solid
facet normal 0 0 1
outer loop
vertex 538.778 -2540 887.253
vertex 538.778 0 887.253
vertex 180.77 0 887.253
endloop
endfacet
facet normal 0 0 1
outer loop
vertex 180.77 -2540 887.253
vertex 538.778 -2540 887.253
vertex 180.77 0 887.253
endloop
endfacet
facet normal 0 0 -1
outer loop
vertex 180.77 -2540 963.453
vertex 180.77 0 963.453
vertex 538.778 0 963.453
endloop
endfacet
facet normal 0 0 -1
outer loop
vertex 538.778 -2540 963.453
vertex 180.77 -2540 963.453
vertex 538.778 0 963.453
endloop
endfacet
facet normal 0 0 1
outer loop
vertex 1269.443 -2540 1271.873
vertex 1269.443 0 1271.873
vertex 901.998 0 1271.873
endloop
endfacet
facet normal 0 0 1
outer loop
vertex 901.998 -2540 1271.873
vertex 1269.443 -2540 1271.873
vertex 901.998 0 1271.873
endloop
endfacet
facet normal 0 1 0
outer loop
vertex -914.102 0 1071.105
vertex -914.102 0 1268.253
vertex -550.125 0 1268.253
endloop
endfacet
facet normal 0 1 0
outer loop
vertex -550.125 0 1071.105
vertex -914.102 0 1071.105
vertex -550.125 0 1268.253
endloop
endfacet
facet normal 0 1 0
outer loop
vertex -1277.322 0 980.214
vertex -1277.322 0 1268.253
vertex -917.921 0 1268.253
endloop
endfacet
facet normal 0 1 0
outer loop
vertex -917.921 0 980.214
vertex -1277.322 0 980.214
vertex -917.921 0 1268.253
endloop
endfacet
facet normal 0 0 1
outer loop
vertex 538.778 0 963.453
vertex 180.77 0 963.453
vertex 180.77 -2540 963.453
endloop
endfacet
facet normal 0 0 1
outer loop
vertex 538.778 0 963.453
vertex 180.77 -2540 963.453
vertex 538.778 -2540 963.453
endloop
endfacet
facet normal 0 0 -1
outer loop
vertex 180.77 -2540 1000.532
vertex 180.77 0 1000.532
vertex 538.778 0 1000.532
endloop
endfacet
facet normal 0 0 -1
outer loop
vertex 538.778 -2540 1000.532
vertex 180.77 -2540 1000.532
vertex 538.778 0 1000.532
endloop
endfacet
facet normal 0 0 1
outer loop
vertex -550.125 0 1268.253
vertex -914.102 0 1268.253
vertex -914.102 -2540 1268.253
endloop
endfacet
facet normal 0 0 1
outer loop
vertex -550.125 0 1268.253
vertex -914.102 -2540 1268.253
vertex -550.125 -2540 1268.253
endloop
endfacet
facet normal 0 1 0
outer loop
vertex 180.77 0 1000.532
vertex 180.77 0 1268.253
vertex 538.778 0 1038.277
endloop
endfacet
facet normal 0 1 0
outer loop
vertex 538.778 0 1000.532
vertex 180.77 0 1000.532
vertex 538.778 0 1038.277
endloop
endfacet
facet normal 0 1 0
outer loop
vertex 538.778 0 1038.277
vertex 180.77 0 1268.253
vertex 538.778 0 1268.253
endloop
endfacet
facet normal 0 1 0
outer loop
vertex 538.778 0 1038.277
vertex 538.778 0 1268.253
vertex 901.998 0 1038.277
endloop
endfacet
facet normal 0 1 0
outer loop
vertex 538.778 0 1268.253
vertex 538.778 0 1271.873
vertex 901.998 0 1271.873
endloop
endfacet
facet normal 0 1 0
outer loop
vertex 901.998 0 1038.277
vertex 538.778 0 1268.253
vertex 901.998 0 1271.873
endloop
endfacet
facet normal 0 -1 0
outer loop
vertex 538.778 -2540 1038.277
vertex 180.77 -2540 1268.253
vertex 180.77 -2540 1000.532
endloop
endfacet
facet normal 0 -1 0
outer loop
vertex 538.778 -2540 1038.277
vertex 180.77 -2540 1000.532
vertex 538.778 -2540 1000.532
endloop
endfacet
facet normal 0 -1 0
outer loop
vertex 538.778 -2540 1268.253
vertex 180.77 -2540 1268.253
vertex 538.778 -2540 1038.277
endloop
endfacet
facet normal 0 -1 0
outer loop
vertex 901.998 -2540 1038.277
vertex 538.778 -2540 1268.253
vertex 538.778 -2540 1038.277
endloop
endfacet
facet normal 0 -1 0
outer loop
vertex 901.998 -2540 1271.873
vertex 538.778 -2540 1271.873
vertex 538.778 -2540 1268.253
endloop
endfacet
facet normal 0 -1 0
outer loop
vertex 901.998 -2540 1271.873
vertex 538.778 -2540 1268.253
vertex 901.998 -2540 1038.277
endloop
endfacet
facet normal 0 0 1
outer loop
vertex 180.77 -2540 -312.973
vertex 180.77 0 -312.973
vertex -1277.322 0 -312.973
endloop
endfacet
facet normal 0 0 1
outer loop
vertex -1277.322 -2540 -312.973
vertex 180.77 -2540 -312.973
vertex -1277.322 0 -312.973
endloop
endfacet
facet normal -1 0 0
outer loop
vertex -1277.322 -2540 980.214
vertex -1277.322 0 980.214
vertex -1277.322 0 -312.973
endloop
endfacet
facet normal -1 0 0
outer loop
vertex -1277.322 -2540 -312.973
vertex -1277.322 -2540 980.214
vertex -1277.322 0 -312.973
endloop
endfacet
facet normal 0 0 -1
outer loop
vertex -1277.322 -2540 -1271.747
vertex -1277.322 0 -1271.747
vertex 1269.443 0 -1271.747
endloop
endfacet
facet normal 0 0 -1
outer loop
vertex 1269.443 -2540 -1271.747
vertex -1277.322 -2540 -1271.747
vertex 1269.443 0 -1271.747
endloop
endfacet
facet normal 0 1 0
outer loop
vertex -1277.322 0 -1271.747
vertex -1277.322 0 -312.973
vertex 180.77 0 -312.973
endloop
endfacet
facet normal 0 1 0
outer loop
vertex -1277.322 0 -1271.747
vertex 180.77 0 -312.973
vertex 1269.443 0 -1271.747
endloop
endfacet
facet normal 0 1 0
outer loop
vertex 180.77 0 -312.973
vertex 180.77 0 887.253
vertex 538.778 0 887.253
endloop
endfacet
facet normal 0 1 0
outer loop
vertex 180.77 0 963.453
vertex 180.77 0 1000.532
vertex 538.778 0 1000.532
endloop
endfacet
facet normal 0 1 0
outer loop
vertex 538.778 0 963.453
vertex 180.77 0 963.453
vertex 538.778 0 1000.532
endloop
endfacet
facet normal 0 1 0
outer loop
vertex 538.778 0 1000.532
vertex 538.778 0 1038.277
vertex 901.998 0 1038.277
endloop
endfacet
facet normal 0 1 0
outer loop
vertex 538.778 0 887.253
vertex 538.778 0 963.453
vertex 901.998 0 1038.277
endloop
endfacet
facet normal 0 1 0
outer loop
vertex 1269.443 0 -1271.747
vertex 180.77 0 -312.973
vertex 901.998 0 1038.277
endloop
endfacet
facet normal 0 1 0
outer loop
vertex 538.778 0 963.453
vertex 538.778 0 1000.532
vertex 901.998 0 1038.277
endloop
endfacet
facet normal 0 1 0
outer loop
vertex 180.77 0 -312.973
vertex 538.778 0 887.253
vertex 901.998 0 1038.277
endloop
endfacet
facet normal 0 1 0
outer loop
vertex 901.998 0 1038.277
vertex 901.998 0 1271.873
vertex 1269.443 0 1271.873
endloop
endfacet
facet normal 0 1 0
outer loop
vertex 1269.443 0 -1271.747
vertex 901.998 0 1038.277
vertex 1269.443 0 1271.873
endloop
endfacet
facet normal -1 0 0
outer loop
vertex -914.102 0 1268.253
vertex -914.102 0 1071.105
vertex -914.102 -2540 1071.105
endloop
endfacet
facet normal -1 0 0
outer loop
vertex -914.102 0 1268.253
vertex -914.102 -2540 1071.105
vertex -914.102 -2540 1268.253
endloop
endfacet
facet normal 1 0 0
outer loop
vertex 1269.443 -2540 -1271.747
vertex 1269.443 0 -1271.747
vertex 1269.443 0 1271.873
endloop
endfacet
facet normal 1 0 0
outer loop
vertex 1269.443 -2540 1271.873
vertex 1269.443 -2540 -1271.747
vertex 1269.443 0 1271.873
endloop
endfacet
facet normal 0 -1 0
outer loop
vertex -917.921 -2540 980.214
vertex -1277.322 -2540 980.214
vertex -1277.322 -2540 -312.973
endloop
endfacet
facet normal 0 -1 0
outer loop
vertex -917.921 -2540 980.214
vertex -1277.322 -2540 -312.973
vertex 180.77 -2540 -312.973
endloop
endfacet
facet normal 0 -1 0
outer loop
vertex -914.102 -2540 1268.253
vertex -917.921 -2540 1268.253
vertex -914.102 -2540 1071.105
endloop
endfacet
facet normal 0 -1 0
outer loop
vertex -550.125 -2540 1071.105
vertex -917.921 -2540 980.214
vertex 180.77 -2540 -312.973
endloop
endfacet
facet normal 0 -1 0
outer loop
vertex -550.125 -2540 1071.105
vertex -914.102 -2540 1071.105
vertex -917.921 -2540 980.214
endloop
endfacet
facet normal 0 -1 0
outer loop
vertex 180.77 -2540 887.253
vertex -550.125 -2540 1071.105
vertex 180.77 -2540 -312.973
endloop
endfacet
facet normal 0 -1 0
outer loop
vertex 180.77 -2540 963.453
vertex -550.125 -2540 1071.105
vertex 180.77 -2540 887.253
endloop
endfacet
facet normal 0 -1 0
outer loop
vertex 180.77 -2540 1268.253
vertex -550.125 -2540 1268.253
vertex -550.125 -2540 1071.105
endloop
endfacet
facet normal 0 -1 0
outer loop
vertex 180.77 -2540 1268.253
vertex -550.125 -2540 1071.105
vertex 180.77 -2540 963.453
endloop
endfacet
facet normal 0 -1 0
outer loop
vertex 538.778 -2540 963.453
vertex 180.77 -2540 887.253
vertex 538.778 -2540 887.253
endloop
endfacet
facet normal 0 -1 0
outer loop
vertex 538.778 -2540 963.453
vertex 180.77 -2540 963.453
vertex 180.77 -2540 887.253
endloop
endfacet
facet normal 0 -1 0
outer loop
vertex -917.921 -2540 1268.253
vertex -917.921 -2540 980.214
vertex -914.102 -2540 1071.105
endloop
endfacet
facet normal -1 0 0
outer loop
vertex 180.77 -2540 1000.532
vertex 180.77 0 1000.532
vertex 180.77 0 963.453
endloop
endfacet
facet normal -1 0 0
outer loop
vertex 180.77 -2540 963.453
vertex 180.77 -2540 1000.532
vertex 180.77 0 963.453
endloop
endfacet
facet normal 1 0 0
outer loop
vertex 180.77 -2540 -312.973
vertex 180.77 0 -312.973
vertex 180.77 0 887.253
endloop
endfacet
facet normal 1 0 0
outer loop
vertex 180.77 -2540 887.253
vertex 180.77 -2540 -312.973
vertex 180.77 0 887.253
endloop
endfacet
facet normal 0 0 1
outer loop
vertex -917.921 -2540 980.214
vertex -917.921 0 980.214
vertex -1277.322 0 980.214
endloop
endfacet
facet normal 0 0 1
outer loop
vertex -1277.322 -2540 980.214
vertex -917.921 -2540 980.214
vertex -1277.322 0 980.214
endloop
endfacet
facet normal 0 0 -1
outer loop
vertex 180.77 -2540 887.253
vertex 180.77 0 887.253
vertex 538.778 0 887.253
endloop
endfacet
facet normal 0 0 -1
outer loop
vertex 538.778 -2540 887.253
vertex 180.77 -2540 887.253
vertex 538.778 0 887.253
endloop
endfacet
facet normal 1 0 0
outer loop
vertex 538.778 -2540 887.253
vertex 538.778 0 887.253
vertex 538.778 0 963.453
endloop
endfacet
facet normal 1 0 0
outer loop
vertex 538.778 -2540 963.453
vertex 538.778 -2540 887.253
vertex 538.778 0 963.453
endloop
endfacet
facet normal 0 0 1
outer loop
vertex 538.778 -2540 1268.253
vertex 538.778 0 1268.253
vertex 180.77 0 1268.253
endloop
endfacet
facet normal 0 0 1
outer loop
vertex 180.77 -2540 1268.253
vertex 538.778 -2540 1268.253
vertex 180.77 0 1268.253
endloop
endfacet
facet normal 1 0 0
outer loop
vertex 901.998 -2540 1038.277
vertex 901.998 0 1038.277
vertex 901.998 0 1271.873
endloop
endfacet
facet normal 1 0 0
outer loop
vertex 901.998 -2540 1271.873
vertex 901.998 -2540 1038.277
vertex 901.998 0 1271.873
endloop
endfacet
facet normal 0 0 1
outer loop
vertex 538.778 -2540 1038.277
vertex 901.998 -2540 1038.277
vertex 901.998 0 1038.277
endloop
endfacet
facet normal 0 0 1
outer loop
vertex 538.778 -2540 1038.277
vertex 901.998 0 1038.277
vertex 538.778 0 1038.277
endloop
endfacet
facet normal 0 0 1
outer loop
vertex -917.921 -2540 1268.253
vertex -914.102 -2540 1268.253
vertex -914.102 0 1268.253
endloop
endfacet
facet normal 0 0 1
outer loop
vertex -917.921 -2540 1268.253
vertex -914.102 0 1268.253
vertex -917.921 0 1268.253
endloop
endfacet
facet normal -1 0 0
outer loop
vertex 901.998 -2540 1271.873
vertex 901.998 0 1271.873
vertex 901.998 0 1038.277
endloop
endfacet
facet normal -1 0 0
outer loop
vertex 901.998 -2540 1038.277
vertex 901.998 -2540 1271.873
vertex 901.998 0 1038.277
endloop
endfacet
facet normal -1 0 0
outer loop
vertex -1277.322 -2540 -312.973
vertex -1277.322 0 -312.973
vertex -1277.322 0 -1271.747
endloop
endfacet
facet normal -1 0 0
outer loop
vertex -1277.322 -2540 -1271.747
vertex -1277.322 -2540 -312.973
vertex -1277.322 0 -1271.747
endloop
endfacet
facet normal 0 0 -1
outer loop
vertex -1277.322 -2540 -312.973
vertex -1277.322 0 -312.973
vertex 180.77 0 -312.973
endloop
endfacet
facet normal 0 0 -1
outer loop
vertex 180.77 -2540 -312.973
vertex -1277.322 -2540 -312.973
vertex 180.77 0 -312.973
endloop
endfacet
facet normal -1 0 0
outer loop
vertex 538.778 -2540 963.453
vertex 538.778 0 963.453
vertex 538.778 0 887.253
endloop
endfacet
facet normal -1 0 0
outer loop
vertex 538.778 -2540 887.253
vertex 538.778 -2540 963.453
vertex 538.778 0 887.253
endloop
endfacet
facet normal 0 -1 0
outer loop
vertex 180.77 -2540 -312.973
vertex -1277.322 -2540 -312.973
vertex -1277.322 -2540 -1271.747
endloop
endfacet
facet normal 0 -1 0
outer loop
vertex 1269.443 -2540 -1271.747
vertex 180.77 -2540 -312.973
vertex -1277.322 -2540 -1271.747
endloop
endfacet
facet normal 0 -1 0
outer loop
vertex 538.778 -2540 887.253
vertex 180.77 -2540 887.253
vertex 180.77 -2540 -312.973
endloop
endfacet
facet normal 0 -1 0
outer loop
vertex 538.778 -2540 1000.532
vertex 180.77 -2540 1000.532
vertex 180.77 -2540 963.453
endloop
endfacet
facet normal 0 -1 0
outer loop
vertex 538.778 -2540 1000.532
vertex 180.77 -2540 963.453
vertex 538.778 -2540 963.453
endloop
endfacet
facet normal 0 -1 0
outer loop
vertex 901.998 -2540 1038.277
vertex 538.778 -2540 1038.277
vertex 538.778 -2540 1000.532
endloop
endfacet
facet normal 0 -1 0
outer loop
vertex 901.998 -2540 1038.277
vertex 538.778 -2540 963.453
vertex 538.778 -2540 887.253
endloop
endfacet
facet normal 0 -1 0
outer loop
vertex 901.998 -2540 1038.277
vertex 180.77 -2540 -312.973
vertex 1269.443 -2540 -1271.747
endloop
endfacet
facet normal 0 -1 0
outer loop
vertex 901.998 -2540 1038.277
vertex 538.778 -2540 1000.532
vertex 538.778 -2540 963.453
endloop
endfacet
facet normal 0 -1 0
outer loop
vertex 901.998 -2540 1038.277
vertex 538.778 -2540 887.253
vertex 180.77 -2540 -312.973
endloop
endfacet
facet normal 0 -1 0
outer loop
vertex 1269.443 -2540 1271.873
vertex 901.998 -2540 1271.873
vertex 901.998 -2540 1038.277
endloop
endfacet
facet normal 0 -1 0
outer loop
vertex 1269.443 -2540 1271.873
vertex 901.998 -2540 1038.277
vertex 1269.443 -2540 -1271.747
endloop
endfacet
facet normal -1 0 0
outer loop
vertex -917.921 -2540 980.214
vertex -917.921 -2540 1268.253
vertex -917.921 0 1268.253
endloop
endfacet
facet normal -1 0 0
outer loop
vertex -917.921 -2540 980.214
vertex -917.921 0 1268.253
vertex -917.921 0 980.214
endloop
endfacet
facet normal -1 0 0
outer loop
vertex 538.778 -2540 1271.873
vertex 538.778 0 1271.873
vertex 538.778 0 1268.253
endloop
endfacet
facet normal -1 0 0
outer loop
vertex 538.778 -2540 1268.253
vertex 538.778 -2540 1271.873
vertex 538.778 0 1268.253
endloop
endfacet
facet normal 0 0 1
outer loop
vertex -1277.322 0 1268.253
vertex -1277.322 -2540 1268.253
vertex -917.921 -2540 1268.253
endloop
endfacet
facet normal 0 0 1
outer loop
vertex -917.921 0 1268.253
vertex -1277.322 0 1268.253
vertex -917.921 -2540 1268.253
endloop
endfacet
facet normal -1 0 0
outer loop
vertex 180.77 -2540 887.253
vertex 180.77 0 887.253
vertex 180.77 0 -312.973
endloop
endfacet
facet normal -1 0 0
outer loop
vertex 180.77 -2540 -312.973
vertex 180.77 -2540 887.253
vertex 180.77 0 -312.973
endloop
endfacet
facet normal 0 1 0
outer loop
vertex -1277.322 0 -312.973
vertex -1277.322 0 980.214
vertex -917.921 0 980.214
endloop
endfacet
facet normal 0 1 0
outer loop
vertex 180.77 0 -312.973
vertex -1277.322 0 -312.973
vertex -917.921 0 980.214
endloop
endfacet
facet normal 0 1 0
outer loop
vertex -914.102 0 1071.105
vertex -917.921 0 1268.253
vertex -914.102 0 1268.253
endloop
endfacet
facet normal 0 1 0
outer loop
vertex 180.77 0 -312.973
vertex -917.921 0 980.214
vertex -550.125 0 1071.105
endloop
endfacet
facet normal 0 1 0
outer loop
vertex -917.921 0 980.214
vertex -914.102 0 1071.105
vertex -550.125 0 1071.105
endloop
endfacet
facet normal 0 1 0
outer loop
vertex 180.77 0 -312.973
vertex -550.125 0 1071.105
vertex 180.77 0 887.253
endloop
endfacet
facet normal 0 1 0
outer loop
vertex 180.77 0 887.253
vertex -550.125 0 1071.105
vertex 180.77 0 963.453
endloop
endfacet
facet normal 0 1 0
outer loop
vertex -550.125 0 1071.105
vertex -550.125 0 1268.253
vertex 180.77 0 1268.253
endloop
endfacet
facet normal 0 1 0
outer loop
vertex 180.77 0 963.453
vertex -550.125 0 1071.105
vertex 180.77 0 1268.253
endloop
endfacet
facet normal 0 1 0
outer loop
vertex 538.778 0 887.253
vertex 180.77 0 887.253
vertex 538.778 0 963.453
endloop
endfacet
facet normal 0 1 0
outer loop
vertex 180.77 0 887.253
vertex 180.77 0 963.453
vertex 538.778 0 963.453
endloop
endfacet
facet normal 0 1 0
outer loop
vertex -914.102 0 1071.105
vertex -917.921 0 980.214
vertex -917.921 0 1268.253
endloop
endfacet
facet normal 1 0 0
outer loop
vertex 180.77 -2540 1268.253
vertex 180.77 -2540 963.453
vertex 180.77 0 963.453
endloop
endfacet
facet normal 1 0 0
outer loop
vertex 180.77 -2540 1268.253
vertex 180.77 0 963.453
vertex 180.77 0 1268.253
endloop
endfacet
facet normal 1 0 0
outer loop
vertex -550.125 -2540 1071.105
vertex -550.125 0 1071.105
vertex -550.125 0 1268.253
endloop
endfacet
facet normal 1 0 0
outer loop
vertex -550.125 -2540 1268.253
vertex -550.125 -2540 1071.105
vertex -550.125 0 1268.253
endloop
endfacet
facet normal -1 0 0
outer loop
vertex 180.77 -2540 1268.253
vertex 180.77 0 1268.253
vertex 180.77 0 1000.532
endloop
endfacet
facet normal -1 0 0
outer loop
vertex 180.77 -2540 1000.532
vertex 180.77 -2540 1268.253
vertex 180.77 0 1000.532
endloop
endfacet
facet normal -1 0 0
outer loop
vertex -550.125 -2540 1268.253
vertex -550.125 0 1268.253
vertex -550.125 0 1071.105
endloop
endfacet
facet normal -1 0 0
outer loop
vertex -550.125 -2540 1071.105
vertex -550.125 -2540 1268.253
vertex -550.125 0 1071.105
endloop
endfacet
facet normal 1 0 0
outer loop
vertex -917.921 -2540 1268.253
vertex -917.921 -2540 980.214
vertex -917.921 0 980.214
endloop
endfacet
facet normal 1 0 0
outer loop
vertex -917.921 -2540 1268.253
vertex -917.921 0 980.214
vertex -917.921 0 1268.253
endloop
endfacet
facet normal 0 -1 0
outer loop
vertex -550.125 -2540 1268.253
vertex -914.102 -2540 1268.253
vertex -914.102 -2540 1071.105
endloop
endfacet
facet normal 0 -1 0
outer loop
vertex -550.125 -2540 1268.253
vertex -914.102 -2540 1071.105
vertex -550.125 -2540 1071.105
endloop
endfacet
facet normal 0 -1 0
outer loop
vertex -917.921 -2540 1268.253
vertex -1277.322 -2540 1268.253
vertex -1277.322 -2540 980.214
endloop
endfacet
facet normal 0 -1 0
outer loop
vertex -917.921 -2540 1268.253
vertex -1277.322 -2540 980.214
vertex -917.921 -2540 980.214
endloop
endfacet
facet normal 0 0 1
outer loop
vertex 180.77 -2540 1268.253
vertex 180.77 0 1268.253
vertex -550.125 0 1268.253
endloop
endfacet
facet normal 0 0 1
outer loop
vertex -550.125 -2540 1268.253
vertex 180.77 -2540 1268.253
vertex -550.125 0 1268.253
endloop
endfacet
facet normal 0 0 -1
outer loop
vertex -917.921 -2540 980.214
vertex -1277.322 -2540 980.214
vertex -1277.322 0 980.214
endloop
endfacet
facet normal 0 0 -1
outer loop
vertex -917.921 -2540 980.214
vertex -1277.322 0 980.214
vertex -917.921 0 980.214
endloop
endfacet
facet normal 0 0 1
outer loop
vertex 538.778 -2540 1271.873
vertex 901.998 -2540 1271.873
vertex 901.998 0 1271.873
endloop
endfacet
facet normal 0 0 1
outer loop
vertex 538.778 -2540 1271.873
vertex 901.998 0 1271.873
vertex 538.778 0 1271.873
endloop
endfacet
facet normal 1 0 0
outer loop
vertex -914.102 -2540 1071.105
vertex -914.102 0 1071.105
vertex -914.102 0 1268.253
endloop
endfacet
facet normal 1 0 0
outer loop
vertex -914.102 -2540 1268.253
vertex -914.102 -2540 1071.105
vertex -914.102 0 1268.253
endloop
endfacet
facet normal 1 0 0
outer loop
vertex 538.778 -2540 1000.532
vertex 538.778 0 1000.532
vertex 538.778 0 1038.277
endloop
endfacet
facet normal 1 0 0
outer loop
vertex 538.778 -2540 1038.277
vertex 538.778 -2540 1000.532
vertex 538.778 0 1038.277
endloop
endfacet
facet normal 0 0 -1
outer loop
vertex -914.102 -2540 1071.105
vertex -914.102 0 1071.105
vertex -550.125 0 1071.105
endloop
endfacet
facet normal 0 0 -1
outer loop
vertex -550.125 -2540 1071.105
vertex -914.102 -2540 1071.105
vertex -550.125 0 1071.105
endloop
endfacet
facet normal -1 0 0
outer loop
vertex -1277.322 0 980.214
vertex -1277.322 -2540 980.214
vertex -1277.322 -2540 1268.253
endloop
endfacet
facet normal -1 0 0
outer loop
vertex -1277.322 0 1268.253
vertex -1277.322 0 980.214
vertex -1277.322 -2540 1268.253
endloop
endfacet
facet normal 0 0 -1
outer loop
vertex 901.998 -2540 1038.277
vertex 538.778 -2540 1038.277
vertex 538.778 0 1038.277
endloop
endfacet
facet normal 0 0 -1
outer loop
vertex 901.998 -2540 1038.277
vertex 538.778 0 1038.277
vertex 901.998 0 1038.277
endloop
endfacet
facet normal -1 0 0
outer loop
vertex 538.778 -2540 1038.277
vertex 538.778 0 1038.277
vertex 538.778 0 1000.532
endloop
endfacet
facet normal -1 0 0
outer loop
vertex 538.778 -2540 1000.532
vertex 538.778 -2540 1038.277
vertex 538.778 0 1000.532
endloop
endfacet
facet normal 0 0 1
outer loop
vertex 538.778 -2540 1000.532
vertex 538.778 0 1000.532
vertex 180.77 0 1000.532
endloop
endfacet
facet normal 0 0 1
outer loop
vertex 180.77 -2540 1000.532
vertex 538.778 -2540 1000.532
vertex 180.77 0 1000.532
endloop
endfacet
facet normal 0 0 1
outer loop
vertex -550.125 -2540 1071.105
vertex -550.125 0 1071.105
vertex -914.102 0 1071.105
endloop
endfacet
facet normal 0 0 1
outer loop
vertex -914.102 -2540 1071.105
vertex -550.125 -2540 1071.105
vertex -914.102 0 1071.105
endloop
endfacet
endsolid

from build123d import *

# Parameters (mm, degrees)
F0_W     = 359.4011852388
F0_H     = 288.038813754
F1_DEPTH = 2540
F0_W_2   = 363.9765930109
F0_H_2   = 197.147512122
F2_DEPTH = 2540
F0_W_3   = 358.0076344128
F0_H_3   = 76.2
F3_DEPTH = 2540
F4_DEPTH = 2540


with BuildPart() as f1:
    # F0 (on Front) → F1 (new body)
    with BuildSketch(Plane.XZ):
        with Locations((-1097.621420485, 1124.2334662299)):
            Rectangle(F0_W, F0_H)
    extrude(amount=F1_DEPTH)


with BuildPart() as f1b:
    # F0 (on Front) → F1, piece 2 (new body)
    with BuildSketch(Plane.XZ):
        Polygon((901.9979868956, 1271.8726735222), (538.7779868956, 1271.8726735222), (538.7779868956, 1268.2528731068), (538.7779868956, 1038.2767915726), (901.9979868956, 1038.2767915726), align=None)
    extrude(amount=F1_DEPTH)

    # F0 (on Front) → F2, piece 2 (join)
    with BuildSketch(Plane.XZ):
        Polygon((538.7779868956, 1268.2528731068), (180.7703524828, 1268.2528731068), (180.7703524828, 1000.5323886871), (538.7779868956, 1000.5323886871), (538.7779868956, 1038.2767915726), align=None)
    extrude(amount=F2_DEPTH)


with BuildPart() as f2:
    # F0 (on Front) → F2 (new body)
    with BuildSketch(Plane.XZ):
        with Locations((-732.113716599, 1169.6791170458)):
            Rectangle(F0_W_2, F0_H_2)
    extrude(amount=F2_DEPTH)


with BuildPart() as f3:
    # F0 (on Front) → F3 (new body)
    with BuildSketch(Plane.XZ):
        Polygon((-917.9208278656, 980.2140593529), (-1277.3220131044, 980.2140593529), (-1277.3220131044, 963.4528731068), (-1277.3220131044, 887.2528731068), (-1277.3220131044, 195.8300620317), (-172.4220131044, 195.8300620317), (-172.4220131044, 1268.2528731068), (-550.1254200935, 1268.2528731068), (-550.1254200935, 1071.1053609848), (-914.1020131044, 1071.1053609848), (-914.1020131044, 1268.2528731068), (-917.9208278656, 1268.2528731068), align=None)
        Polygon((-172.4220131044, 195.8300620317), (-1277.3220131044, 195.8300620317), (-1277.3220131044, -312.9727840424), (180.7703524828, -312.9727840424), (180.7703524828, 887.2528731068), (180.7703524828, 963.4528731068), (180.7703524828, 1000.5323886871), (180.7703524828, 1268.2528731068), (-172.4220131044, 1268.2528731068), align=None)
        with Locations((359.7741696892, 925.3528731068)):
            Rectangle(F0_W_3, F0_H_3)
    extrude(amount=F3_DEPTH)


with BuildPart() as f4:
    # F0 (on Front) → F4 (new body)
    with BuildSketch(Plane.XZ):
        Polygon((1269.4430012173, 1271.8726735222), (901.9979868956, 1271.8726735222), (901.9979868956, 1038.2767915726), (901.9979868956, 1000.5323886871), (1269.4430012173, 1000.5323886871), align=None)
        Polygon((180.7703524828, -312.9727840424), (-1277.3220131044, -312.9727840424), (-1277.3220131044, -1271.7471268932), (1269.4430012173, -1271.7471268932), (1269.4430012173, 1000.5323886871), (901.9979868956, 1000.5323886871), (901.9979868956, 1038.2767915726), (538.7779868956, 1038.2767915726), (538.7779868956, 1000.5323886871), (180.7703524828, 1000.5323886871), (180.7703524828, 963.4528731068), (538.7779868956, 963.4528731068), (538.7779868956, 887.2528731068), (180.7703524828, 887.2528731068), align=None)
    extrude(amount=F4_DEPTH)


solid = Compound([f1.part, f1b.part, f2.part, f3.part, f4.part])
